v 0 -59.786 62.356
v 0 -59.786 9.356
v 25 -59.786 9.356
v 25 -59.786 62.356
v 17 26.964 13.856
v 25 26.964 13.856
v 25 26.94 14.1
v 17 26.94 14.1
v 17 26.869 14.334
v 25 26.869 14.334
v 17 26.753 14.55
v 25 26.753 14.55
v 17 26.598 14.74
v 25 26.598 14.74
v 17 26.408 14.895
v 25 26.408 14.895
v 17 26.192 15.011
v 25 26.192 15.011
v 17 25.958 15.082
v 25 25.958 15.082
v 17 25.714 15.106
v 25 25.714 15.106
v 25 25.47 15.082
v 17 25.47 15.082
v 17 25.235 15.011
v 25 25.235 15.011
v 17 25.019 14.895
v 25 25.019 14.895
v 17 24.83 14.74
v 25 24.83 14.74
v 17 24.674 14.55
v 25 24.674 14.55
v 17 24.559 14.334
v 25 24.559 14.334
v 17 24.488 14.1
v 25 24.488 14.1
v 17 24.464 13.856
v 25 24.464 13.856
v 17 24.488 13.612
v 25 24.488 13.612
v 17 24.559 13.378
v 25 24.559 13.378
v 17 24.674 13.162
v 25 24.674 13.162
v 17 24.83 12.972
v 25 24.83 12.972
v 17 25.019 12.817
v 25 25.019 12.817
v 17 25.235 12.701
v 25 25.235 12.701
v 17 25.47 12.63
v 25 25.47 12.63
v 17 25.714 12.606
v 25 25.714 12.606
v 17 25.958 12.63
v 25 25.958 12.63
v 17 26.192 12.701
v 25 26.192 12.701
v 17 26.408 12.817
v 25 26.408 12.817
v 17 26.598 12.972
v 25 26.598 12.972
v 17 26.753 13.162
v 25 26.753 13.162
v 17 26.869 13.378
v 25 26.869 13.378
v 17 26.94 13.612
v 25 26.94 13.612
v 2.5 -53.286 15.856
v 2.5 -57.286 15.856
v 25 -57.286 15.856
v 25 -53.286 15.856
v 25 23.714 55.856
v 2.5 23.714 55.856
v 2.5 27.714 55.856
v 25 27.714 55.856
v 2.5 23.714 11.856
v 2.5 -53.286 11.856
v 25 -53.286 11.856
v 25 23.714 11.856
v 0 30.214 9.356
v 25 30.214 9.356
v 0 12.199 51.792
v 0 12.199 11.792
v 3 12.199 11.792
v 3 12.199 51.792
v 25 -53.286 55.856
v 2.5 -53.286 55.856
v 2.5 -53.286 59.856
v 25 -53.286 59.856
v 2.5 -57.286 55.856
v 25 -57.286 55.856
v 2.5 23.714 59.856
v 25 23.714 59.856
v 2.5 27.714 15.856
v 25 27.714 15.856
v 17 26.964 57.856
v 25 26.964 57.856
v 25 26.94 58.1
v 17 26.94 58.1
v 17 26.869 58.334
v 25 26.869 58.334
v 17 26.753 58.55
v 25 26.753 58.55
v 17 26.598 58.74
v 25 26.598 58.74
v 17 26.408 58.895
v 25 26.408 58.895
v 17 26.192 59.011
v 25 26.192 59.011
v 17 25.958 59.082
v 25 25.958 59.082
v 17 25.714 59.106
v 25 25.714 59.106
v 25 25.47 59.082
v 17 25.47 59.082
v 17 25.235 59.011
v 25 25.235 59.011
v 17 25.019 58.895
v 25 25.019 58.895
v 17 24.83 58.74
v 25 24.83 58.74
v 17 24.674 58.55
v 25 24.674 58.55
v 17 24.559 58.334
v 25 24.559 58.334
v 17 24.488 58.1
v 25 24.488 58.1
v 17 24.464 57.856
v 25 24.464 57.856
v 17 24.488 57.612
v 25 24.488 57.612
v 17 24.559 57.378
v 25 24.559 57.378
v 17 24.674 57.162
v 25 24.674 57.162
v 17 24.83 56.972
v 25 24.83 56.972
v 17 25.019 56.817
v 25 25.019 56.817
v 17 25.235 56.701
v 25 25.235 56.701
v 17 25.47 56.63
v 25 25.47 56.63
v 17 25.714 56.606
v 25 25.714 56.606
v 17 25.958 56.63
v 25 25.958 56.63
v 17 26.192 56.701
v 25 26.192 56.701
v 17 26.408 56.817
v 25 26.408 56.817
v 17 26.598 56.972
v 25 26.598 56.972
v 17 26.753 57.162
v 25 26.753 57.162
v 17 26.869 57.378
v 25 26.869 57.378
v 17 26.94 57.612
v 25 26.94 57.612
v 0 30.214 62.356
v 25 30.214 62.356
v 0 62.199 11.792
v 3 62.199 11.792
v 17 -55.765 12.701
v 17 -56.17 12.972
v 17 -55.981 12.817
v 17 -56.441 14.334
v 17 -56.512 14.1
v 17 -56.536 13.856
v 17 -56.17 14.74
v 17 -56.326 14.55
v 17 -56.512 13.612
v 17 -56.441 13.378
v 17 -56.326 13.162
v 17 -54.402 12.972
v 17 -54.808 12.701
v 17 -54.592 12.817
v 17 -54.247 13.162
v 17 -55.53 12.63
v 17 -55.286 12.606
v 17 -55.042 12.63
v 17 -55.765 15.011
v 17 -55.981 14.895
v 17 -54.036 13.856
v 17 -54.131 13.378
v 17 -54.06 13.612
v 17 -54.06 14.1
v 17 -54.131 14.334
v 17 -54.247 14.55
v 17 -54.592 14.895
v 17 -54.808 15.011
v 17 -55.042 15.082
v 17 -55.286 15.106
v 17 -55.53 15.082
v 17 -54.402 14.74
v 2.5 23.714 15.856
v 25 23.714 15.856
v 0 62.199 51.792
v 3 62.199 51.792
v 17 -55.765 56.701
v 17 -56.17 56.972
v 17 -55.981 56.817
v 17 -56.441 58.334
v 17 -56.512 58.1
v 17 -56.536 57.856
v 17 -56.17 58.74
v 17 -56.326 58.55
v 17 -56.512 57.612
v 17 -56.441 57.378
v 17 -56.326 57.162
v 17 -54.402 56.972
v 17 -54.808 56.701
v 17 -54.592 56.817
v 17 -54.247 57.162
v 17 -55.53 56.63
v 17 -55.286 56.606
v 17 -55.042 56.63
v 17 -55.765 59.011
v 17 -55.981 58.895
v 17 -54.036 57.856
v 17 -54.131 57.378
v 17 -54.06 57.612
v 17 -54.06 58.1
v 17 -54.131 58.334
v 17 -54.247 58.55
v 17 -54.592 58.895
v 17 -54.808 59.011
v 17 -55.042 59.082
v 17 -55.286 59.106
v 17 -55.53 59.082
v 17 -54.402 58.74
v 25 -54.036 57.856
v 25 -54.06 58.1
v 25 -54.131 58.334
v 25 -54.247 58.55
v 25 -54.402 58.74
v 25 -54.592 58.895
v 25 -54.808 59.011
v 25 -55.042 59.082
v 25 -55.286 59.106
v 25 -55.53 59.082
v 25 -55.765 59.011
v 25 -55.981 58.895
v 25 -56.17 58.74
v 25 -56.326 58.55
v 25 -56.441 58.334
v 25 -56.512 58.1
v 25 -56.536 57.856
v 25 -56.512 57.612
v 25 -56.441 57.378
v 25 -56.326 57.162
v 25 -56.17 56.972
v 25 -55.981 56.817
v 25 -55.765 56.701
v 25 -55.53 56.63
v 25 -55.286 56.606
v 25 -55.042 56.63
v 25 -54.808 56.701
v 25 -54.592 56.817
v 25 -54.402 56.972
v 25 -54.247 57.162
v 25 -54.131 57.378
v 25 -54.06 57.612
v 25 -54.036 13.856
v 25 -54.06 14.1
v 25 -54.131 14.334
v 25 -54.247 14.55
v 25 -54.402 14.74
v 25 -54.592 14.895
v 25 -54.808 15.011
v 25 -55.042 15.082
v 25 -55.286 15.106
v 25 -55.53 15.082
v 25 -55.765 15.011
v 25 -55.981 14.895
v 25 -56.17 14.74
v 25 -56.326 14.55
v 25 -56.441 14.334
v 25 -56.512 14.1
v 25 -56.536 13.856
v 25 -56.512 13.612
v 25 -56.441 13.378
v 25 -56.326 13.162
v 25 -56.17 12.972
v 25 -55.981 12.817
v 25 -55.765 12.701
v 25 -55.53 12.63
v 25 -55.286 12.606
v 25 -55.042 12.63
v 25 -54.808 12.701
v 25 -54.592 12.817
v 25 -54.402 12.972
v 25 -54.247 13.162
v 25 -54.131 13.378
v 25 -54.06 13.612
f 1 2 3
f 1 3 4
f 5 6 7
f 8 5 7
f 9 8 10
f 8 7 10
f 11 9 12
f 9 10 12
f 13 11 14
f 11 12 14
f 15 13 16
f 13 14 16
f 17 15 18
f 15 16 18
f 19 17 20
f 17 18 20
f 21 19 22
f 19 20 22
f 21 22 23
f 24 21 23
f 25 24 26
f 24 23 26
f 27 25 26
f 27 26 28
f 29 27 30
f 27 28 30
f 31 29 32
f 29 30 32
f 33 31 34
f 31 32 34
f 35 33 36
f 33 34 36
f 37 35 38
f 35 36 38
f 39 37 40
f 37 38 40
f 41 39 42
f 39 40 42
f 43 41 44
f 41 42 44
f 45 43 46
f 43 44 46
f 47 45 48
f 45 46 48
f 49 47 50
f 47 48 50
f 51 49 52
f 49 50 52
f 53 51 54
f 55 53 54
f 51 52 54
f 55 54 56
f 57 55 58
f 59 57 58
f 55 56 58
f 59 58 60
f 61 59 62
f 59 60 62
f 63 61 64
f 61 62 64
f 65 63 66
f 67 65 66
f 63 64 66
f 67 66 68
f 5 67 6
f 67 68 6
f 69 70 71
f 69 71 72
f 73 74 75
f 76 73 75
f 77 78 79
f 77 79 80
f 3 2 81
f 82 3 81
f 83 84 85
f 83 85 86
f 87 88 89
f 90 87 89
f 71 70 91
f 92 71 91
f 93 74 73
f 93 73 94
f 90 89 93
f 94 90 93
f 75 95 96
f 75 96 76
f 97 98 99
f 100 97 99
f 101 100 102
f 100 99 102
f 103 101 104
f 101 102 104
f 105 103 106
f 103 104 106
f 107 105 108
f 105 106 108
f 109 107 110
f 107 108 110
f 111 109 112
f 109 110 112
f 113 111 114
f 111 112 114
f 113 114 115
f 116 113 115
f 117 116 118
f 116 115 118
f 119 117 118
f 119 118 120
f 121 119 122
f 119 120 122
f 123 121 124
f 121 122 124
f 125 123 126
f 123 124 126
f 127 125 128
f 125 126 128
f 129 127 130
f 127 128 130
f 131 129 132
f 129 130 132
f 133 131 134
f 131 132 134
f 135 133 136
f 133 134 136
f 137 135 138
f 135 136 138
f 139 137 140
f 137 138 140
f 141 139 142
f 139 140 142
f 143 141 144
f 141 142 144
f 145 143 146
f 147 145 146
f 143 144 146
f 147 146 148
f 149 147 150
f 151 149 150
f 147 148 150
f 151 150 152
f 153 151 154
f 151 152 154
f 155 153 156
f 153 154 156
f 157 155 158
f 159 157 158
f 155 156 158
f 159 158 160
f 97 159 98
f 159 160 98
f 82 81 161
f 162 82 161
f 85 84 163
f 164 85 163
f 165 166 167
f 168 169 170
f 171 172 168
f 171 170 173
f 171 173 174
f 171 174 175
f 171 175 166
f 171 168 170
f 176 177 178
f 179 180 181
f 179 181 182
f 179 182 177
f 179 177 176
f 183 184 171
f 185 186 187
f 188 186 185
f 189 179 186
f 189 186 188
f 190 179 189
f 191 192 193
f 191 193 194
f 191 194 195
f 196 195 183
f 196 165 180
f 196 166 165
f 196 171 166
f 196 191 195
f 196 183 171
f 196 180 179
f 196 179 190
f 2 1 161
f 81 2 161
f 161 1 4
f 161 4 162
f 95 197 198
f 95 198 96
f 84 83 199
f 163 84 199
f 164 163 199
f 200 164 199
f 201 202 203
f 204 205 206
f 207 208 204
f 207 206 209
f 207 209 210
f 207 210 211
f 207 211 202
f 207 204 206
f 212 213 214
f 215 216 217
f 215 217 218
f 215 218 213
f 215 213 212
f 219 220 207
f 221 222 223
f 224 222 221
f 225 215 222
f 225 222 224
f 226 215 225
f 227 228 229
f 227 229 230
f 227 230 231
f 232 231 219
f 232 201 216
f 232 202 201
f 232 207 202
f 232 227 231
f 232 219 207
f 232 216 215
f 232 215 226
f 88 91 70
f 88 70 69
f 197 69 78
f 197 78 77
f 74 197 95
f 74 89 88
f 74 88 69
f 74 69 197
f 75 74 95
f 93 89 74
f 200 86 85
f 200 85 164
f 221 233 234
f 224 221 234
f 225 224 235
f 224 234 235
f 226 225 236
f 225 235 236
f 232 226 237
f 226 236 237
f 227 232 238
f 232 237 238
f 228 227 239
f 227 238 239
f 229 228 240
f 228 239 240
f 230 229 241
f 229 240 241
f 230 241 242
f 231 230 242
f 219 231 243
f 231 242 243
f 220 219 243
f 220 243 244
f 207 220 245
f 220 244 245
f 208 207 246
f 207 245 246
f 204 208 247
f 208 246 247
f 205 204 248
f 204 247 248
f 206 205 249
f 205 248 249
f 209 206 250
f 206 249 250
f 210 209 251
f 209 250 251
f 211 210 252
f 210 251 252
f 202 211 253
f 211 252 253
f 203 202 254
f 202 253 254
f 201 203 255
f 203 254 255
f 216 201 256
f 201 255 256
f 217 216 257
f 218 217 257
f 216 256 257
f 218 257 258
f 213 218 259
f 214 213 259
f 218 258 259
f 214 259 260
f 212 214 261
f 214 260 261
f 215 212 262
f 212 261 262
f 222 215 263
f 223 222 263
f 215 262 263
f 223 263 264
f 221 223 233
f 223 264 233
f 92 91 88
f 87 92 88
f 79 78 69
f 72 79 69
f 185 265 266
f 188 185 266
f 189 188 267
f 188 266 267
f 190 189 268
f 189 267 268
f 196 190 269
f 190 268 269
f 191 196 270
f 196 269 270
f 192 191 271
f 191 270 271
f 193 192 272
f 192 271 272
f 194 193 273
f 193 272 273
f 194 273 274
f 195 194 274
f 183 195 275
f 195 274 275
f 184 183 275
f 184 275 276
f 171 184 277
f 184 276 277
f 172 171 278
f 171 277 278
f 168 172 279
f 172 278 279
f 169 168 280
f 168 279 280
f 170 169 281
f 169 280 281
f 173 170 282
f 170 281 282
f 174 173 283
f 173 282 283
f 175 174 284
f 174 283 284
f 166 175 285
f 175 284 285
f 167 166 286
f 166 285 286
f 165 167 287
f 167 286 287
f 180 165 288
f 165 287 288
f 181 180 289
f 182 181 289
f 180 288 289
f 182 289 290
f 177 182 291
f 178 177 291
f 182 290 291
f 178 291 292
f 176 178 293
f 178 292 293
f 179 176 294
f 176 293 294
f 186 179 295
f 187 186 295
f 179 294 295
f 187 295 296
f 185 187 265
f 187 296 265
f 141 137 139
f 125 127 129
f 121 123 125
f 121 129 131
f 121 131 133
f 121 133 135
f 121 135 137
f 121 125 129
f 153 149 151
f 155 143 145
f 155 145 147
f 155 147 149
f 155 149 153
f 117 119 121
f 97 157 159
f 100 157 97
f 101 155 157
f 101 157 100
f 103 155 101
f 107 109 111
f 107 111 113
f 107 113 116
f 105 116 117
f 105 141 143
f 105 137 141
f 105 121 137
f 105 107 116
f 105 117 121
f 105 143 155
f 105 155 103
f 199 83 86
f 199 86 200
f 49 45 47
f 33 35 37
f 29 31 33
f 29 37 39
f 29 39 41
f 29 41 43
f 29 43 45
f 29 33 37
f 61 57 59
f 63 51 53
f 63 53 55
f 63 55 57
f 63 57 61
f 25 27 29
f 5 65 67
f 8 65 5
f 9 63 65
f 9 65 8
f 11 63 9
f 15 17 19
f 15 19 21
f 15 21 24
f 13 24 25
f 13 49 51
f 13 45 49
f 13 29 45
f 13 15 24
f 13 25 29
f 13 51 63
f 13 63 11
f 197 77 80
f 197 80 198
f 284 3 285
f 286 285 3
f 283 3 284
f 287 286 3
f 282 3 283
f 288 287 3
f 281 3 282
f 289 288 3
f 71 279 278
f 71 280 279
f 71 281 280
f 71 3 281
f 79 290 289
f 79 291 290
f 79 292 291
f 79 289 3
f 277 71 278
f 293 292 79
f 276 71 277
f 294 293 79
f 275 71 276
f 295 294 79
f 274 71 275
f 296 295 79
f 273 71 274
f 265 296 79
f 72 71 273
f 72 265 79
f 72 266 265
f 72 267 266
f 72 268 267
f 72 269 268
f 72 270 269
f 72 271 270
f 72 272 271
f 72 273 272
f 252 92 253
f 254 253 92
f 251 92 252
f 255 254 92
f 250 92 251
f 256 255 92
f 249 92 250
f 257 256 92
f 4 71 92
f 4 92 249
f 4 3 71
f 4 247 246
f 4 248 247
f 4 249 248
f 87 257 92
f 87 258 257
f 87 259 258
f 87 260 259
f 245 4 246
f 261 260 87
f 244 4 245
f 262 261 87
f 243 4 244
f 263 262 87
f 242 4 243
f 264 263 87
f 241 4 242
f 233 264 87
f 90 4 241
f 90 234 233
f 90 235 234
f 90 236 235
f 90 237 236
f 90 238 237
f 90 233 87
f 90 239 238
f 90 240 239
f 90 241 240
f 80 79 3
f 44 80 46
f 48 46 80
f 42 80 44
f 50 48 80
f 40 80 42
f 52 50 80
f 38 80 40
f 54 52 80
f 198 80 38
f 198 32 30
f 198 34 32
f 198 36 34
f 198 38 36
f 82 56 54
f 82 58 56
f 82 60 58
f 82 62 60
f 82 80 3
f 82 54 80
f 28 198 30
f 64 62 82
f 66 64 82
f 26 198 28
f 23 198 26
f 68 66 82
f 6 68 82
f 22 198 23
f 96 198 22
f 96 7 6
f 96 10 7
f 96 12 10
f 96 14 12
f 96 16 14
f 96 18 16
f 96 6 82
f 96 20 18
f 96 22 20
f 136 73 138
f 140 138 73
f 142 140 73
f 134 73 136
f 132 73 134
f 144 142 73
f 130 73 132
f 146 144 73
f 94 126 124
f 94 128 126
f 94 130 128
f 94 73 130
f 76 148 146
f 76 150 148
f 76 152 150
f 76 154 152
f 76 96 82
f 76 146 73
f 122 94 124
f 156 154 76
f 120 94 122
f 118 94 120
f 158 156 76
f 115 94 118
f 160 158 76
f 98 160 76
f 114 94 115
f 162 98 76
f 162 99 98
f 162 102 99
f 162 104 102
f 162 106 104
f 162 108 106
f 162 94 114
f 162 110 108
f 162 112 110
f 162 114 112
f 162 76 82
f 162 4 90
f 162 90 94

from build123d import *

# Parameters (mm, degrees)
F0_W      = 90
F0_H      = 53
F1_DEPTH  = 25
F2_T      = -2.5
F3_W      = 4
F3_H      = 4
F4_DEPTH  = 22.5
F5_W      = 4
F5_H      = 4
F6_DEPTH  = 22.5
F7_W      = 4
F7_H      = 4
F8_DEPTH  = 22.5
F9_R      = 1.25
F10_DEPTH = 8
F11_W     = 50
F11_H     = 40
F12_DEPTH = 3


with BuildPart() as f1:
    # F0 (on Right) → F1 (new body)
    with BuildSketch(Plane.YZ):
        with Locations((-14.786185, 35.856023)):
            Rectangle(F0_W, F0_H)
    extrude(amount=F1_DEPTH)

    # F2
    f2_openings = [f1.faces().sort_by_distance(p)[0] for p in [
        (25, -14.786185, 35.856023),
    ]]
    offset(amount=F2_T, openings=f2_openings)

    # F3 (on face) → F4 (join)
    with BuildSketch(Plane.YZ.offset(2.5)):
        with Locations((-55.286185, 57.856023)):
            Rectangle(F3_W, F3_H)
    extrude(amount=F4_DEPTH)

    # F5 (on face) → F6 (join)
    with BuildSketch(Plane.YZ.offset(2.5)):
        with Locations((-55.286185, 13.856023)):
            Rectangle(F5_W, F5_H)
    extrude(amount=F6_DEPTH)

    # F7 (on face) → F8 (join)
    with BuildSketch(Plane.YZ.offset(2.5)):
        with Locations((25.713815, 57.856023)):
            Rectangle(F7_W, F7_H)
        with Locations((25.713815, 13.856023)):
            Rectangle(F7_W, F7_H)
    extrude(amount=F8_DEPTH)

    # F9 (on face) → F10 (cut)
    with BuildSketch(Plane.YZ.offset(25)):
        with Locations((25.713815, 13.856023)):
            Circle(F9_R)
        with Locations((25.713815, 57.856023)):
            Circle(F9_R)
        with Locations((-55.286185, 13.856023)):
            Circle(F9_R)
        with Locations((-55.286185, 57.856023)):
            Circle(F9_R)
    extrude(amount=-F10_DEPTH, mode=Mode.SUBTRACT)


with BuildPart() as f12:
    # F11 (on Right) → F12 (new body)
    with BuildSketch(Plane.YZ):
        with Locations((37.198514, 31.791784)):
            Rectangle(F11_W, F11_H)
    extrude(amount=F12_DEPTH)


solid = Compound([f1.part, f12.part])
